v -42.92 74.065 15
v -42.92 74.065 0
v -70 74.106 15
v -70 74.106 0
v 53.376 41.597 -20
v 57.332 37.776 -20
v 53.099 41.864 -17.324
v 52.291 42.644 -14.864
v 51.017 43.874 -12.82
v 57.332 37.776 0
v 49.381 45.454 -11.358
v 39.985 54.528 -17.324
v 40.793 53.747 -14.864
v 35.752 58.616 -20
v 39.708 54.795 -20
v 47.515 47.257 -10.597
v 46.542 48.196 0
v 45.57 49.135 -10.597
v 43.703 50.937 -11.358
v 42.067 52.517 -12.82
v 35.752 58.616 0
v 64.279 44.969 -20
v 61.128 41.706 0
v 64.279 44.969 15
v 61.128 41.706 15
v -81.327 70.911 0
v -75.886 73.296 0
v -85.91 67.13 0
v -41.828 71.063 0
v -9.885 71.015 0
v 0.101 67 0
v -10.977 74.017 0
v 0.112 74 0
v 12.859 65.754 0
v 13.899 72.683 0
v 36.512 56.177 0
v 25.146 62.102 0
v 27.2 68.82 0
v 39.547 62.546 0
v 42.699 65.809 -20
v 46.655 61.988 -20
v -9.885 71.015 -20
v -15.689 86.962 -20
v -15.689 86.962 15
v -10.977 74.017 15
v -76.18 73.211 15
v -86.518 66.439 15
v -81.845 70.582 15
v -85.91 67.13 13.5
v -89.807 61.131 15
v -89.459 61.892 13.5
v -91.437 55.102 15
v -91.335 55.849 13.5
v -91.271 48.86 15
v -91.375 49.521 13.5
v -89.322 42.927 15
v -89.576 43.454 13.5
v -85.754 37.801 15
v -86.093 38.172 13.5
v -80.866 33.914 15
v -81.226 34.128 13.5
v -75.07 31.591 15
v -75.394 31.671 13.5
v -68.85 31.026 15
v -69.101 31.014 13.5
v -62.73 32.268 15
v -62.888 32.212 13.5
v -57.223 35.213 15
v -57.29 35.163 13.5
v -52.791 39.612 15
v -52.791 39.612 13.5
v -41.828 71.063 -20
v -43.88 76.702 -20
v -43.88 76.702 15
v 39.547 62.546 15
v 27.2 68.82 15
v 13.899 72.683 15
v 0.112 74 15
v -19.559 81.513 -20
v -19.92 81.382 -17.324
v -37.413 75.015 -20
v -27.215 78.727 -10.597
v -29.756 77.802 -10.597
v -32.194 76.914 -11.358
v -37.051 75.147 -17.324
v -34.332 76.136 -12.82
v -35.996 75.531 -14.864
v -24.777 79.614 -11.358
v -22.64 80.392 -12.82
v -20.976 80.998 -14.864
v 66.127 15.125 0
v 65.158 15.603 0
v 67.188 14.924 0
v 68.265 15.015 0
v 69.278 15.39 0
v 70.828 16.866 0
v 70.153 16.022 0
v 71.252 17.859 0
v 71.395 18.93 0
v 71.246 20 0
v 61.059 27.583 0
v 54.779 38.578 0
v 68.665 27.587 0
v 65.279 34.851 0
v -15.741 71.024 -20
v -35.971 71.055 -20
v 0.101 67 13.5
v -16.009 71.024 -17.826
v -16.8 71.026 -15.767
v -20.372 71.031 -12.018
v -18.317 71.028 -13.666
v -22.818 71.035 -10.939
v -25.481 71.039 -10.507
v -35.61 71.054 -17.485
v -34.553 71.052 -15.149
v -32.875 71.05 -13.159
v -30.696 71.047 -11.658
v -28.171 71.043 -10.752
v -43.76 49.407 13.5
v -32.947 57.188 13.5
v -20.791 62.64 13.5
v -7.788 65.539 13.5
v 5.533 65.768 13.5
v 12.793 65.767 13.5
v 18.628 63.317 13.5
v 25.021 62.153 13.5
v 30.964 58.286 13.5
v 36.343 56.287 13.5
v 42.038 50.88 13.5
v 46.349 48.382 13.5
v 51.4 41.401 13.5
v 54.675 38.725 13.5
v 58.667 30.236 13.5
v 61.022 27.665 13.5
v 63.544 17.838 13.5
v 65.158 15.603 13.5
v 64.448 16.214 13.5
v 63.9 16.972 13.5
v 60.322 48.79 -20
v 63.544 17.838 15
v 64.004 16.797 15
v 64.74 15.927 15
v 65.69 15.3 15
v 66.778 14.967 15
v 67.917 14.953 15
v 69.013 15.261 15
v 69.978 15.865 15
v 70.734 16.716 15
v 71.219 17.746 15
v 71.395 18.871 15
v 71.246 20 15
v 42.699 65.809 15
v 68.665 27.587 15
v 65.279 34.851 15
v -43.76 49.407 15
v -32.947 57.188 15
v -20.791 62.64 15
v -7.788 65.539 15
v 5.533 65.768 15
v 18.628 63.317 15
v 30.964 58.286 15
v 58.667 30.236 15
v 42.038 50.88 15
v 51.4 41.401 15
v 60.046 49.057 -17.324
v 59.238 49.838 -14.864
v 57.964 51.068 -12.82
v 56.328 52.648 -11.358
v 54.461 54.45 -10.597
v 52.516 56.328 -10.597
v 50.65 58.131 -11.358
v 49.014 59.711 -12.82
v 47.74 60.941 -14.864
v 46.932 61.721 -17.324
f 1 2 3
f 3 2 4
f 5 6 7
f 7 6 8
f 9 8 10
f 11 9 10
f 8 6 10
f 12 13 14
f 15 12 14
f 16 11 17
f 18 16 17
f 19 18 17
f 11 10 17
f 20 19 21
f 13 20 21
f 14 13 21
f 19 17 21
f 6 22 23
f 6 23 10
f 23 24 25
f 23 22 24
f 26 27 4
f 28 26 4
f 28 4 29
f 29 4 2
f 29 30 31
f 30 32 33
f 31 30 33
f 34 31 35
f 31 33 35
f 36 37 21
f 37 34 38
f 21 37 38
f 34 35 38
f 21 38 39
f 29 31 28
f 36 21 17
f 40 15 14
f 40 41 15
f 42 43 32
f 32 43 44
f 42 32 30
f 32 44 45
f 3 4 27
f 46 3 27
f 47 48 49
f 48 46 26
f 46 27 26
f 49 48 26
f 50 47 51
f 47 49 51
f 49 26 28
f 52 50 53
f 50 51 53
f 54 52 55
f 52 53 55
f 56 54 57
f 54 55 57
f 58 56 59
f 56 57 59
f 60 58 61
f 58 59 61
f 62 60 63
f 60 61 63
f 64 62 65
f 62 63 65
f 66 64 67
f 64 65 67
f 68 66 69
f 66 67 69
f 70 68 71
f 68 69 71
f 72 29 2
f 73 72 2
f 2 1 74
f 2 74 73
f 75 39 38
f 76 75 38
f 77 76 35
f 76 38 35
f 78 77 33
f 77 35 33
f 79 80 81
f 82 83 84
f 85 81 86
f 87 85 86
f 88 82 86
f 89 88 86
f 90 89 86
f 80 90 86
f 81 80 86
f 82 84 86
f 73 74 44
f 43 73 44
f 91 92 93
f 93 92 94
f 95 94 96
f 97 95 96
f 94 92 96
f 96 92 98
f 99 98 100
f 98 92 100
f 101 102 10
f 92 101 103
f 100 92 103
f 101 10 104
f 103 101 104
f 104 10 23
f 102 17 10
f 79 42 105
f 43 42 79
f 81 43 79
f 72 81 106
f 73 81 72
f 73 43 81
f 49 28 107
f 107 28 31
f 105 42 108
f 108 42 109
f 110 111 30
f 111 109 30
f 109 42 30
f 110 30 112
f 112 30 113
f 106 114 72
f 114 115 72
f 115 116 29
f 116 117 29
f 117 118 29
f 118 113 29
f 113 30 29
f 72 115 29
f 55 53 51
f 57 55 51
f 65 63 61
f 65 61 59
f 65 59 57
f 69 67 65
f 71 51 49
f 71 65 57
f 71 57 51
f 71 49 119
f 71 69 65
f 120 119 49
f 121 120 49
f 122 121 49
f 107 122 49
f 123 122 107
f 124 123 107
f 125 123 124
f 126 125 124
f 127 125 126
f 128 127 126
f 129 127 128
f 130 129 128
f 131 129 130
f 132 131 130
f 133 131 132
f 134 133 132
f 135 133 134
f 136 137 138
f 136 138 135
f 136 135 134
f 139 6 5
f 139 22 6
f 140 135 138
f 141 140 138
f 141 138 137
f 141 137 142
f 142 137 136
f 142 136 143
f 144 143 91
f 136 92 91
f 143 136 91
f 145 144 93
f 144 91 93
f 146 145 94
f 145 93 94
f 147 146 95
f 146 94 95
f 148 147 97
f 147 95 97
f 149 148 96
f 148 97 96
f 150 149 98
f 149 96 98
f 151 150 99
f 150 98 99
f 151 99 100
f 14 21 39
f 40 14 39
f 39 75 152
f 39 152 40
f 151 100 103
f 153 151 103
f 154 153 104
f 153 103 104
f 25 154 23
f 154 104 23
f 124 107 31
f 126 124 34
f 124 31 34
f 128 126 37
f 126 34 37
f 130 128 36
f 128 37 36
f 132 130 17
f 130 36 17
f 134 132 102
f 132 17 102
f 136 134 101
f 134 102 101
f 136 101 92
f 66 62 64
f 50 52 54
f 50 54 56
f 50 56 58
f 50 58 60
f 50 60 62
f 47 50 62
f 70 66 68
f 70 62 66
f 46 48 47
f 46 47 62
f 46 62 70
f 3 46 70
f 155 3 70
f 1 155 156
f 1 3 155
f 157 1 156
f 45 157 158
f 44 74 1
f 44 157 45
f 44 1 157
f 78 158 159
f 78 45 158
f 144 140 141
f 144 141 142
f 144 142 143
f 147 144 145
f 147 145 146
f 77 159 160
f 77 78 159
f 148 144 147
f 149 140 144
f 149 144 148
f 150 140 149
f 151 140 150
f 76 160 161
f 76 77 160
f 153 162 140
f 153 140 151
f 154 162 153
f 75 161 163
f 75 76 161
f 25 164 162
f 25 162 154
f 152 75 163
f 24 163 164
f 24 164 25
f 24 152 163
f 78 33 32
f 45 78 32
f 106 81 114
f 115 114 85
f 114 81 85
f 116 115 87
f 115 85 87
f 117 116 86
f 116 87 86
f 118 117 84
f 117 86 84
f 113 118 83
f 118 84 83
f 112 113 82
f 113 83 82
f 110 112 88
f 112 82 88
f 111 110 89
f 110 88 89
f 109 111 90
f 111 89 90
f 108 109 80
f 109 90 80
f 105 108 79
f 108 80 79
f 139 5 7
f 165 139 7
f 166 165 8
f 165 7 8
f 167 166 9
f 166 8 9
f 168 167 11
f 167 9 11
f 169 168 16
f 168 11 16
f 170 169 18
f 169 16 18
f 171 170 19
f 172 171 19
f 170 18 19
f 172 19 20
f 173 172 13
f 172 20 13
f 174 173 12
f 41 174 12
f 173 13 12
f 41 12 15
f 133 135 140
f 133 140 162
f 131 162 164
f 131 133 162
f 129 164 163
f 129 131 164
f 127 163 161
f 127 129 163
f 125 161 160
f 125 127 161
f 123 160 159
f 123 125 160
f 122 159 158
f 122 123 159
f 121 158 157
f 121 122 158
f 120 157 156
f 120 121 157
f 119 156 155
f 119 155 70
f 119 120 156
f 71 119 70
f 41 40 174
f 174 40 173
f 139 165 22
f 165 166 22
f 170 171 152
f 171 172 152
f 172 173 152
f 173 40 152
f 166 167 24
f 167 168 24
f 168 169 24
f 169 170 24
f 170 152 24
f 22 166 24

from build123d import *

# Parameters (mm, degrees)
PAD_DEPTH       = 15
SKETCH002_R     = 67
POCKET_DEPTH    = 13.5
POCKET001_DEPTH = 13.5
PAD001_DEPTH    = 35
PAD002_DEPTH    = 35
SKETCH_R        = 9.5
POCKET002_DEPTH = 45.1514534441
SKETCH007_R     = 9.5
POCKET003_DEPTH = 93.6873432021


with BuildPart() as part:
    # Sketch001 → Pad (new body)
    with BuildSketch(Plane.XY):
        with BuildLine():
            ThreePointArc((71.2460525222, 20), (44.7436533058, 58.9406946756), (0.1121090023, 73.9999150781))
            Line((0.1121090023, 73.9999150781), (-70, 74.1061334774))
            ThreePointArc((-69.9999999999, 74.1061334774), (-89.3215614177, 42.9266570301), (-52.7907882568, 39.6122793491))
            ThreePointArc((63.5437766663, 17.8378375087), (12.1424161228, 64.8734285413), (-52.7907882568, 39.6122793491))
            ThreePointArc((63.5437766663, 17.8378375087), (68.4759958054, 15.0677809492), (71.2460525222, 20))
        make_face()
    extrude(amount=PAD_DEPTH)

    # Sketch002 → Pocket (cut)
    with BuildSketch(Plane(origin=(0, 0, 0), x_dir=(1, 0, 0), z_dir=(0, 0, -1))):
        Circle(SKETCH002_R)
    extrude(amount=-POCKET_DEPTH, mode=Mode.SUBTRACT)

    # Sketch003 → Pocket001 (cut)
    with BuildSketch(Plane(origin=(0, 0, 0), x_dir=(1, 0, 0), z_dir=(0, 0, -1))):
        Polygon((-153.2553251378, -67.2322555451), (0.1014988729, -66.9999231192), (-35.4631, 35.7409), align=None)
    extrude(amount=-POCKET001_DEPTH, mode=Mode.SUBTRACT)

    # Sketch005 → Pad001 (new body)
    with BuildSketch(Plane.XY.offset(15)):
        Polygon((35.7520138156, 58.6156421796), (42.6985975202, 65.809040183), (64.2787915304, 44.9692890692), (57.3322078258, 37.7758910658), align=None)
    extrude(amount=-PAD001_DEPTH)

    # Sketch006 → Pad002 (new body)
    with BuildSketch(Plane.XY.offset(15)):
        Polygon((-41.8276469497, 71.0634495008), (-43.8797678097, 76.7016052255), (-15.6889891861, 86.9622095253), (-9.8847001983, 71.0150565952), align=None)
    extrude(amount=-PAD002_DEPTH)

    # Sketch → Pocket002 (cut, through all)
    with BuildSketch(Plane(origin=(46.5421108207, 48.1957666227, 0), x_dir=(0.7193398003, -0.6946583705, 0), z_dir=(-0.6946583705, -0.7193398003, 0))):
        with Locations((0, -20)):
            Circle(SKETCH_R)
    extrude(amount=-POCKET002_DEPTH, mode=Mode.SUBTRACT)

    # Sketch007 → Pocket003 (cut, through all)
    with BuildSketch(Plane(origin=(-28.4858461346, 78.2642190287, 0), x_dir=(-0.9396926208, -0.3420201433, 0), z_dir=(-0.3420201433, 0.9396926208, 0))):
        with Locations((0, -20)):
            Circle(SKETCH007_R)
    extrude(amount=-POCKET003_DEPTH, mode=Mode.SUBTRACT)


solid = part.part
